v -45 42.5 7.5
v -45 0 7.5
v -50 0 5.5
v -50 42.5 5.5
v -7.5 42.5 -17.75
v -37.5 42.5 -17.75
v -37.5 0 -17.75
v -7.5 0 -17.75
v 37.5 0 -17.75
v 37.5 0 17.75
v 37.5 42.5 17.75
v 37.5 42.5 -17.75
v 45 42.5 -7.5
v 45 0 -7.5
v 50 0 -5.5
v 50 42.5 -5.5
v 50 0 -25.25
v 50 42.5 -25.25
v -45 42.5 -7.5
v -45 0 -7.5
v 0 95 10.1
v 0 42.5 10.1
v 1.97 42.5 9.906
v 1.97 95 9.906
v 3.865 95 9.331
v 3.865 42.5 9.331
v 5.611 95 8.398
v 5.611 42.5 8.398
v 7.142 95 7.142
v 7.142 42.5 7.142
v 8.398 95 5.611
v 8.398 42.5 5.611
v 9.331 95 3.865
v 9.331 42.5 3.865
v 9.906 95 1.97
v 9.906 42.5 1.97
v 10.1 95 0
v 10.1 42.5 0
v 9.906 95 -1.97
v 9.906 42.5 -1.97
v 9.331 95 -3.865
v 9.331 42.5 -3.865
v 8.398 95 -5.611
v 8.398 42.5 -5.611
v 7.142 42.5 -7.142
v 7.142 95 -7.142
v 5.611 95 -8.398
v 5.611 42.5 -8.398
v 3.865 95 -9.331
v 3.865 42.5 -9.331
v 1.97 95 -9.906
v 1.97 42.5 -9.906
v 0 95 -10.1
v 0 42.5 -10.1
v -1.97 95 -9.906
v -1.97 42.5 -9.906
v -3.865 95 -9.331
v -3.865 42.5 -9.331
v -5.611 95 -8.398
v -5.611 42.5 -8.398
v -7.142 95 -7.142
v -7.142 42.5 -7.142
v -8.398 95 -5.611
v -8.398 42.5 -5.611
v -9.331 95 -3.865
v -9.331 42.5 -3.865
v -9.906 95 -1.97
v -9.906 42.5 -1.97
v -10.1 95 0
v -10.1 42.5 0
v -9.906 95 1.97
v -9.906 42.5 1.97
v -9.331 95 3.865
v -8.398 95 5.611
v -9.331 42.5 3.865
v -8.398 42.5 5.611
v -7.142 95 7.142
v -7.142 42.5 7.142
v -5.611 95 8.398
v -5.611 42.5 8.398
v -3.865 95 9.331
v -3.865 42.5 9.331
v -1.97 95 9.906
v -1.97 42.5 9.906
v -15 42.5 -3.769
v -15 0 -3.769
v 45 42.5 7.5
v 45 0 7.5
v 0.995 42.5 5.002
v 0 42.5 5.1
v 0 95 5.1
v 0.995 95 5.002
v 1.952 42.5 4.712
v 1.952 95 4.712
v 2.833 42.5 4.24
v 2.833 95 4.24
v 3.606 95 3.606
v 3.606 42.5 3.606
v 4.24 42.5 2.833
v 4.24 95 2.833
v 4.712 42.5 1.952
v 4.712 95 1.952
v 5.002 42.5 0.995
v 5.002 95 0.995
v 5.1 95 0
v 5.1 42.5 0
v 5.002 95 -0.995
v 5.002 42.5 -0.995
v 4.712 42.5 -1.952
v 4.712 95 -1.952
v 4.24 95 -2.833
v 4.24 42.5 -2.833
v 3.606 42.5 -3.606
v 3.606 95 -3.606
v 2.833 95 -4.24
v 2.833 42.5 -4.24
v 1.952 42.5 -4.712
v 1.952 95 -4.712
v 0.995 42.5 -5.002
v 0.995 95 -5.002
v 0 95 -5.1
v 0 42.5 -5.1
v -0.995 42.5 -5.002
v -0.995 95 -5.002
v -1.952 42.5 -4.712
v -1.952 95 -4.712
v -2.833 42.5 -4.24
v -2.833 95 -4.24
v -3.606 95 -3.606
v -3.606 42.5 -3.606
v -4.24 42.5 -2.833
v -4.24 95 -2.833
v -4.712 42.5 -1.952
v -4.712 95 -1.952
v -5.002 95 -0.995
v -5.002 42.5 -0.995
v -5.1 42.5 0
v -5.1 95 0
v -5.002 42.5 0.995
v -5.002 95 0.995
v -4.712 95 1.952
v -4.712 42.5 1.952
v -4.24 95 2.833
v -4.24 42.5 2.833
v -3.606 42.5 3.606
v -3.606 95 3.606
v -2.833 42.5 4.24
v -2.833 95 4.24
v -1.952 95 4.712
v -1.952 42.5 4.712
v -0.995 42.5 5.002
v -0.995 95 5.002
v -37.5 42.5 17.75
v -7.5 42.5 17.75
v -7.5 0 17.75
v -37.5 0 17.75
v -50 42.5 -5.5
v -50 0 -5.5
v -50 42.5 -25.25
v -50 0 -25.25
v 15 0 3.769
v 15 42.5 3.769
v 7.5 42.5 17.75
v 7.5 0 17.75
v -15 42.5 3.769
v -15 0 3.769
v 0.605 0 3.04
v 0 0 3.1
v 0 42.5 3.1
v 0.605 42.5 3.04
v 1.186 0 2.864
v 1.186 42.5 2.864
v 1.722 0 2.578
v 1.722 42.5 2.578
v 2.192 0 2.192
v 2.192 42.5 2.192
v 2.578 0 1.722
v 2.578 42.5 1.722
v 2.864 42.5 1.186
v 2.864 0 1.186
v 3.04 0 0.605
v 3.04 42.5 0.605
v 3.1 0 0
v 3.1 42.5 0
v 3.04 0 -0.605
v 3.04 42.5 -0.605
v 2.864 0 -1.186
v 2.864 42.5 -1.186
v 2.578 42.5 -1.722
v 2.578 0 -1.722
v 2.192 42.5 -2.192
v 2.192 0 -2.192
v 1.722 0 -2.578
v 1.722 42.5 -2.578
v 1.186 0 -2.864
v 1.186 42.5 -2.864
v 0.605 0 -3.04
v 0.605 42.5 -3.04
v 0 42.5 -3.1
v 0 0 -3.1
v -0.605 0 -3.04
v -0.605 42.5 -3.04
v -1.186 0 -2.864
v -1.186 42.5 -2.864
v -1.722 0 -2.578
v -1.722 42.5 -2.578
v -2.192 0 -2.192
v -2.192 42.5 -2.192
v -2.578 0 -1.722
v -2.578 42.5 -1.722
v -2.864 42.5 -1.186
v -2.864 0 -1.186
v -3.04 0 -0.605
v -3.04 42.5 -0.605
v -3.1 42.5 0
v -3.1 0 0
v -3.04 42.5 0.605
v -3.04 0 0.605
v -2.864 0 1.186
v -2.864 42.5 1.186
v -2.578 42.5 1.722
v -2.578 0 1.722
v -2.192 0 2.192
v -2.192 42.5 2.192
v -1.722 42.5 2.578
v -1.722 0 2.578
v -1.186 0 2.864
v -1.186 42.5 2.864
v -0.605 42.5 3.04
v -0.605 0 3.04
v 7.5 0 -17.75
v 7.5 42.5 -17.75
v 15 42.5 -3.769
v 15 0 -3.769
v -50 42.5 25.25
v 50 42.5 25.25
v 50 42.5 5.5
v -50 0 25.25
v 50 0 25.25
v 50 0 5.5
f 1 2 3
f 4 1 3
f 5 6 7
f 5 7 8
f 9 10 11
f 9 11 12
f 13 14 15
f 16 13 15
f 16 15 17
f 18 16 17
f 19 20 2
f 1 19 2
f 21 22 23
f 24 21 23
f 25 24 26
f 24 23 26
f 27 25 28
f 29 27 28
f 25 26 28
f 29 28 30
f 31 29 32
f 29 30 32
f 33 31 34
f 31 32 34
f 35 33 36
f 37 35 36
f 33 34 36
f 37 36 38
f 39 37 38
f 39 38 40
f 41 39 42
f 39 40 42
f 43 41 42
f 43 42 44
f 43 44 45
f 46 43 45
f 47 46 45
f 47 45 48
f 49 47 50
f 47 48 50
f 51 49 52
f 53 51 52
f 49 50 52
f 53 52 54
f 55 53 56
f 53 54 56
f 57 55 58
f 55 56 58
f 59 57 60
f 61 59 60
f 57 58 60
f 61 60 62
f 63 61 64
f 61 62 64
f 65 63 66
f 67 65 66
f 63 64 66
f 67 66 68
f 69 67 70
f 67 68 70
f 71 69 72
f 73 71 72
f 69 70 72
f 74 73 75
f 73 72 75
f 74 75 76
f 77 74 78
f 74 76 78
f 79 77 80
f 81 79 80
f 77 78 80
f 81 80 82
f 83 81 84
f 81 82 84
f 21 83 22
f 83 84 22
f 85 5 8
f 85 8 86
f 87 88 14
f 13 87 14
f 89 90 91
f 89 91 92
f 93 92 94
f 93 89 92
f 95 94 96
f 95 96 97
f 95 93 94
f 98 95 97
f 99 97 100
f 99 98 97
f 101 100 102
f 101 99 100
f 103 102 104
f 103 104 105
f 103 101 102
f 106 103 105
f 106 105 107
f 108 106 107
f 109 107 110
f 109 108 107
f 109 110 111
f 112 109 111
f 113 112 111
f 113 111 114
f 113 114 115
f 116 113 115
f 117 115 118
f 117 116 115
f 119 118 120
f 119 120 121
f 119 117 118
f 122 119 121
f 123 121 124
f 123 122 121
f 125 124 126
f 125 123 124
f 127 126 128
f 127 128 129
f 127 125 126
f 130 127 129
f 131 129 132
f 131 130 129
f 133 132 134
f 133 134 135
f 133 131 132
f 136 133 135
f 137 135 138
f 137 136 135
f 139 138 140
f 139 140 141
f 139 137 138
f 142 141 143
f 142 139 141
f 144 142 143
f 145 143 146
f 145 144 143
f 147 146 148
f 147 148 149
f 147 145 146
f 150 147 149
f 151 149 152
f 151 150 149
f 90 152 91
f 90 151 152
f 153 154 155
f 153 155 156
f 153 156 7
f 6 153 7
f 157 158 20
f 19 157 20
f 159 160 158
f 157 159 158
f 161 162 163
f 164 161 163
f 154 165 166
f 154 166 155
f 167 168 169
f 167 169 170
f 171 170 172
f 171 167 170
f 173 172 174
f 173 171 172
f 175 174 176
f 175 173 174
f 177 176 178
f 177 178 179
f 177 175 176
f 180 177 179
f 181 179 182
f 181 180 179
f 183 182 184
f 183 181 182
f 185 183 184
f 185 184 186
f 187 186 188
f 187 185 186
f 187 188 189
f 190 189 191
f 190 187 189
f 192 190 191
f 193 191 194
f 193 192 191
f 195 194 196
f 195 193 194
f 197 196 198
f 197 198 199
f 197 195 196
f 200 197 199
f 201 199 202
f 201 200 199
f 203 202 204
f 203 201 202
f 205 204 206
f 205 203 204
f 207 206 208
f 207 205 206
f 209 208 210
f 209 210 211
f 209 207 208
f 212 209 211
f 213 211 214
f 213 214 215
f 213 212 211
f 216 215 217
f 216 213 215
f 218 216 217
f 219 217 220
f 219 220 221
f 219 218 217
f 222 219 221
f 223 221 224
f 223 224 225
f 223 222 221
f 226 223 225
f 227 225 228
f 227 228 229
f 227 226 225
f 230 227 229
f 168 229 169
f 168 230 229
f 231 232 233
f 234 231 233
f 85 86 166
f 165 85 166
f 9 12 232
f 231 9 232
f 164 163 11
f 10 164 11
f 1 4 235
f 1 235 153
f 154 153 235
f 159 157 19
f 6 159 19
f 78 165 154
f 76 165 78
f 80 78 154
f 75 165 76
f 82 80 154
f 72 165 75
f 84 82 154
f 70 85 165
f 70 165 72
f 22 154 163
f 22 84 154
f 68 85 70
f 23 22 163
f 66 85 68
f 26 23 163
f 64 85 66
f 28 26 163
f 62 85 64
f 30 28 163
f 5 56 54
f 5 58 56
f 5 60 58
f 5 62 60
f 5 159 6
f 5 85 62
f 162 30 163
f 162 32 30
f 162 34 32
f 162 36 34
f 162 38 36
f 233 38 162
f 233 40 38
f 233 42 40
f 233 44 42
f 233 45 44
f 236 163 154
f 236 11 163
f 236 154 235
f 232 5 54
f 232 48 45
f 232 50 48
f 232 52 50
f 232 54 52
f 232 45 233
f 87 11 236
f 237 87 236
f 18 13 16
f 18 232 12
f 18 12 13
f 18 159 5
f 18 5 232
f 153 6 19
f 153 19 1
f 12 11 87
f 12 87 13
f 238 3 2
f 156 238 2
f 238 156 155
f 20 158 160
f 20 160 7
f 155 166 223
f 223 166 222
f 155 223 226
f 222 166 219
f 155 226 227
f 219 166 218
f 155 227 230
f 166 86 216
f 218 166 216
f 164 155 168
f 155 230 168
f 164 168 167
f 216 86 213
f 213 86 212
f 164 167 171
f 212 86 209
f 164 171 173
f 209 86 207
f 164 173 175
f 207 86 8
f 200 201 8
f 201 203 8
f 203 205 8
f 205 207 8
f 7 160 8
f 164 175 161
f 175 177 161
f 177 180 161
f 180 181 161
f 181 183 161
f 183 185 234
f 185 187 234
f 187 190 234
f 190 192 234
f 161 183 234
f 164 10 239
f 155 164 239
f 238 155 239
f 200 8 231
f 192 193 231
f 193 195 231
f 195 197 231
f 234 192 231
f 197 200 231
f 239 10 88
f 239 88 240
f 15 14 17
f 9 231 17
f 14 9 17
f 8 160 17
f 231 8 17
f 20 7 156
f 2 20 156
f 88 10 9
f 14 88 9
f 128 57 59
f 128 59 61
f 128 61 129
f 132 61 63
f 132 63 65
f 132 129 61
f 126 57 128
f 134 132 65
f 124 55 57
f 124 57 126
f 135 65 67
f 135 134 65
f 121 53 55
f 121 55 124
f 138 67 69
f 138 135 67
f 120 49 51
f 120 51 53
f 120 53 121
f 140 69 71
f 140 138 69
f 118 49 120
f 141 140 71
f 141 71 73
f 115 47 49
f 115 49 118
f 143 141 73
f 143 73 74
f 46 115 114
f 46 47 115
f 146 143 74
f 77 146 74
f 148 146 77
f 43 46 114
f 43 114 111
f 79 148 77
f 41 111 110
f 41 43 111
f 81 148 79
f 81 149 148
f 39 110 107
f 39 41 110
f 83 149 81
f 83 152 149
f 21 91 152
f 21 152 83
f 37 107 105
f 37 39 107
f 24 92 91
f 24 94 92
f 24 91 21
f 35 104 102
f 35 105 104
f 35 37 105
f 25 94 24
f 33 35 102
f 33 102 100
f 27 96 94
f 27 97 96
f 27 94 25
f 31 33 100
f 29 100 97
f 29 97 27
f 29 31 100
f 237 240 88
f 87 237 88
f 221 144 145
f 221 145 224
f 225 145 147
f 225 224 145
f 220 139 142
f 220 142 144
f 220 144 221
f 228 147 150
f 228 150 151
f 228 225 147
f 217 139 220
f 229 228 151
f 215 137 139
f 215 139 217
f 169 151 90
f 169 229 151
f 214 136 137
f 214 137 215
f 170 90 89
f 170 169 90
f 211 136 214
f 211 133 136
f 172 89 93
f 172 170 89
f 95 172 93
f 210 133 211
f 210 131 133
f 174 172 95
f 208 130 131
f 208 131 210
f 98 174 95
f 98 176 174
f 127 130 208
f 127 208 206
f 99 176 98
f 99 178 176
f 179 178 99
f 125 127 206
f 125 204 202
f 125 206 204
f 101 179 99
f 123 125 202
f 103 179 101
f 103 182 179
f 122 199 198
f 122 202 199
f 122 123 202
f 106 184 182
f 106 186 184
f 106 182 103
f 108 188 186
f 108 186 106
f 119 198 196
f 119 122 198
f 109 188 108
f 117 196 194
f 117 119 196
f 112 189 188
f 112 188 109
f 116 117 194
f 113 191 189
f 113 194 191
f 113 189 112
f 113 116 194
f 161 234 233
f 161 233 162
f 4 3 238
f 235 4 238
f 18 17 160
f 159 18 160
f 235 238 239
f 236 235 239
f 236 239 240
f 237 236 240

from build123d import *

# Parameters (mm, degrees)
SKETCH1_R           = 3.1
BOSS_EXTRUDE1_DEPTH = 42.5
SKETCH2_R           = 10.1
SKETCH2_R_2         = 5.1
BOSS_EXTRUDE2_DEPTH = 52.5
CUT_EXTRUDE1_DEPTH  = 42.5


with BuildPart() as part:
    # Sketch1 → Boss-Extrude1 (new body)
    with BuildSketch(Plane(origin=(0, 0, 0), x_dir=(1, 0, 0), z_dir=(0, 1, 0))):
        Polygon((-50, 25.25), (-50, 5.5), (-45, 7.5), (-45, -7.5), (-50, -5.5), (-50, -25.25), (50, -25.25), (50, -5.5), (45, -7.5), (45, 7.5), (50, 5.5), (50, 25.25), align=None)
        with Locations(Location((0, 0, 0), (0, 0, 270))):
            Circle(SKETCH1_R, mode=Mode.SUBTRACT)
    extrude(amount=BOSS_EXTRUDE1_DEPTH)

    # Sketch2 → Boss-Extrude2 (add)
    with BuildSketch(Plane(origin=(0, 42.5, 0), x_dir=(1, 0, 0), z_dir=(0, 1, 0))):
        with Locations(Location((0, 0, 0), (0, 0, 270))):
            Circle(SKETCH2_R)
        with Locations(Location((0, 0, 0), (0, 0, 270))):
            Circle(SKETCH2_R_2, mode=Mode.SUBTRACT)
    extrude(amount=BOSS_EXTRUDE2_DEPTH)

    # Sketch3 → Cut-Extrude1 (cut)
    with BuildSketch(Plane(origin=(0, 42.5, 0), x_dir=(1, 0, 0), z_dir=(0, 1, 0))):
        Polygon((-37.5, -17.75), (-37.5, 17.75), (-7.5, 17.75), (-15, 3.769353064), (-15, -3.769353064), (-7.5, -17.75), align=None)
        Polygon((15, -3.769353064), (7.5, -17.75), (37.5, -17.75), (37.5, 17.75), (7.5, 17.75), (15, 3.769353064), align=None)
    extrude(amount=-CUT_EXTRUDE1_DEPTH, mode=Mode.SUBTRACT)


solid = part.part
